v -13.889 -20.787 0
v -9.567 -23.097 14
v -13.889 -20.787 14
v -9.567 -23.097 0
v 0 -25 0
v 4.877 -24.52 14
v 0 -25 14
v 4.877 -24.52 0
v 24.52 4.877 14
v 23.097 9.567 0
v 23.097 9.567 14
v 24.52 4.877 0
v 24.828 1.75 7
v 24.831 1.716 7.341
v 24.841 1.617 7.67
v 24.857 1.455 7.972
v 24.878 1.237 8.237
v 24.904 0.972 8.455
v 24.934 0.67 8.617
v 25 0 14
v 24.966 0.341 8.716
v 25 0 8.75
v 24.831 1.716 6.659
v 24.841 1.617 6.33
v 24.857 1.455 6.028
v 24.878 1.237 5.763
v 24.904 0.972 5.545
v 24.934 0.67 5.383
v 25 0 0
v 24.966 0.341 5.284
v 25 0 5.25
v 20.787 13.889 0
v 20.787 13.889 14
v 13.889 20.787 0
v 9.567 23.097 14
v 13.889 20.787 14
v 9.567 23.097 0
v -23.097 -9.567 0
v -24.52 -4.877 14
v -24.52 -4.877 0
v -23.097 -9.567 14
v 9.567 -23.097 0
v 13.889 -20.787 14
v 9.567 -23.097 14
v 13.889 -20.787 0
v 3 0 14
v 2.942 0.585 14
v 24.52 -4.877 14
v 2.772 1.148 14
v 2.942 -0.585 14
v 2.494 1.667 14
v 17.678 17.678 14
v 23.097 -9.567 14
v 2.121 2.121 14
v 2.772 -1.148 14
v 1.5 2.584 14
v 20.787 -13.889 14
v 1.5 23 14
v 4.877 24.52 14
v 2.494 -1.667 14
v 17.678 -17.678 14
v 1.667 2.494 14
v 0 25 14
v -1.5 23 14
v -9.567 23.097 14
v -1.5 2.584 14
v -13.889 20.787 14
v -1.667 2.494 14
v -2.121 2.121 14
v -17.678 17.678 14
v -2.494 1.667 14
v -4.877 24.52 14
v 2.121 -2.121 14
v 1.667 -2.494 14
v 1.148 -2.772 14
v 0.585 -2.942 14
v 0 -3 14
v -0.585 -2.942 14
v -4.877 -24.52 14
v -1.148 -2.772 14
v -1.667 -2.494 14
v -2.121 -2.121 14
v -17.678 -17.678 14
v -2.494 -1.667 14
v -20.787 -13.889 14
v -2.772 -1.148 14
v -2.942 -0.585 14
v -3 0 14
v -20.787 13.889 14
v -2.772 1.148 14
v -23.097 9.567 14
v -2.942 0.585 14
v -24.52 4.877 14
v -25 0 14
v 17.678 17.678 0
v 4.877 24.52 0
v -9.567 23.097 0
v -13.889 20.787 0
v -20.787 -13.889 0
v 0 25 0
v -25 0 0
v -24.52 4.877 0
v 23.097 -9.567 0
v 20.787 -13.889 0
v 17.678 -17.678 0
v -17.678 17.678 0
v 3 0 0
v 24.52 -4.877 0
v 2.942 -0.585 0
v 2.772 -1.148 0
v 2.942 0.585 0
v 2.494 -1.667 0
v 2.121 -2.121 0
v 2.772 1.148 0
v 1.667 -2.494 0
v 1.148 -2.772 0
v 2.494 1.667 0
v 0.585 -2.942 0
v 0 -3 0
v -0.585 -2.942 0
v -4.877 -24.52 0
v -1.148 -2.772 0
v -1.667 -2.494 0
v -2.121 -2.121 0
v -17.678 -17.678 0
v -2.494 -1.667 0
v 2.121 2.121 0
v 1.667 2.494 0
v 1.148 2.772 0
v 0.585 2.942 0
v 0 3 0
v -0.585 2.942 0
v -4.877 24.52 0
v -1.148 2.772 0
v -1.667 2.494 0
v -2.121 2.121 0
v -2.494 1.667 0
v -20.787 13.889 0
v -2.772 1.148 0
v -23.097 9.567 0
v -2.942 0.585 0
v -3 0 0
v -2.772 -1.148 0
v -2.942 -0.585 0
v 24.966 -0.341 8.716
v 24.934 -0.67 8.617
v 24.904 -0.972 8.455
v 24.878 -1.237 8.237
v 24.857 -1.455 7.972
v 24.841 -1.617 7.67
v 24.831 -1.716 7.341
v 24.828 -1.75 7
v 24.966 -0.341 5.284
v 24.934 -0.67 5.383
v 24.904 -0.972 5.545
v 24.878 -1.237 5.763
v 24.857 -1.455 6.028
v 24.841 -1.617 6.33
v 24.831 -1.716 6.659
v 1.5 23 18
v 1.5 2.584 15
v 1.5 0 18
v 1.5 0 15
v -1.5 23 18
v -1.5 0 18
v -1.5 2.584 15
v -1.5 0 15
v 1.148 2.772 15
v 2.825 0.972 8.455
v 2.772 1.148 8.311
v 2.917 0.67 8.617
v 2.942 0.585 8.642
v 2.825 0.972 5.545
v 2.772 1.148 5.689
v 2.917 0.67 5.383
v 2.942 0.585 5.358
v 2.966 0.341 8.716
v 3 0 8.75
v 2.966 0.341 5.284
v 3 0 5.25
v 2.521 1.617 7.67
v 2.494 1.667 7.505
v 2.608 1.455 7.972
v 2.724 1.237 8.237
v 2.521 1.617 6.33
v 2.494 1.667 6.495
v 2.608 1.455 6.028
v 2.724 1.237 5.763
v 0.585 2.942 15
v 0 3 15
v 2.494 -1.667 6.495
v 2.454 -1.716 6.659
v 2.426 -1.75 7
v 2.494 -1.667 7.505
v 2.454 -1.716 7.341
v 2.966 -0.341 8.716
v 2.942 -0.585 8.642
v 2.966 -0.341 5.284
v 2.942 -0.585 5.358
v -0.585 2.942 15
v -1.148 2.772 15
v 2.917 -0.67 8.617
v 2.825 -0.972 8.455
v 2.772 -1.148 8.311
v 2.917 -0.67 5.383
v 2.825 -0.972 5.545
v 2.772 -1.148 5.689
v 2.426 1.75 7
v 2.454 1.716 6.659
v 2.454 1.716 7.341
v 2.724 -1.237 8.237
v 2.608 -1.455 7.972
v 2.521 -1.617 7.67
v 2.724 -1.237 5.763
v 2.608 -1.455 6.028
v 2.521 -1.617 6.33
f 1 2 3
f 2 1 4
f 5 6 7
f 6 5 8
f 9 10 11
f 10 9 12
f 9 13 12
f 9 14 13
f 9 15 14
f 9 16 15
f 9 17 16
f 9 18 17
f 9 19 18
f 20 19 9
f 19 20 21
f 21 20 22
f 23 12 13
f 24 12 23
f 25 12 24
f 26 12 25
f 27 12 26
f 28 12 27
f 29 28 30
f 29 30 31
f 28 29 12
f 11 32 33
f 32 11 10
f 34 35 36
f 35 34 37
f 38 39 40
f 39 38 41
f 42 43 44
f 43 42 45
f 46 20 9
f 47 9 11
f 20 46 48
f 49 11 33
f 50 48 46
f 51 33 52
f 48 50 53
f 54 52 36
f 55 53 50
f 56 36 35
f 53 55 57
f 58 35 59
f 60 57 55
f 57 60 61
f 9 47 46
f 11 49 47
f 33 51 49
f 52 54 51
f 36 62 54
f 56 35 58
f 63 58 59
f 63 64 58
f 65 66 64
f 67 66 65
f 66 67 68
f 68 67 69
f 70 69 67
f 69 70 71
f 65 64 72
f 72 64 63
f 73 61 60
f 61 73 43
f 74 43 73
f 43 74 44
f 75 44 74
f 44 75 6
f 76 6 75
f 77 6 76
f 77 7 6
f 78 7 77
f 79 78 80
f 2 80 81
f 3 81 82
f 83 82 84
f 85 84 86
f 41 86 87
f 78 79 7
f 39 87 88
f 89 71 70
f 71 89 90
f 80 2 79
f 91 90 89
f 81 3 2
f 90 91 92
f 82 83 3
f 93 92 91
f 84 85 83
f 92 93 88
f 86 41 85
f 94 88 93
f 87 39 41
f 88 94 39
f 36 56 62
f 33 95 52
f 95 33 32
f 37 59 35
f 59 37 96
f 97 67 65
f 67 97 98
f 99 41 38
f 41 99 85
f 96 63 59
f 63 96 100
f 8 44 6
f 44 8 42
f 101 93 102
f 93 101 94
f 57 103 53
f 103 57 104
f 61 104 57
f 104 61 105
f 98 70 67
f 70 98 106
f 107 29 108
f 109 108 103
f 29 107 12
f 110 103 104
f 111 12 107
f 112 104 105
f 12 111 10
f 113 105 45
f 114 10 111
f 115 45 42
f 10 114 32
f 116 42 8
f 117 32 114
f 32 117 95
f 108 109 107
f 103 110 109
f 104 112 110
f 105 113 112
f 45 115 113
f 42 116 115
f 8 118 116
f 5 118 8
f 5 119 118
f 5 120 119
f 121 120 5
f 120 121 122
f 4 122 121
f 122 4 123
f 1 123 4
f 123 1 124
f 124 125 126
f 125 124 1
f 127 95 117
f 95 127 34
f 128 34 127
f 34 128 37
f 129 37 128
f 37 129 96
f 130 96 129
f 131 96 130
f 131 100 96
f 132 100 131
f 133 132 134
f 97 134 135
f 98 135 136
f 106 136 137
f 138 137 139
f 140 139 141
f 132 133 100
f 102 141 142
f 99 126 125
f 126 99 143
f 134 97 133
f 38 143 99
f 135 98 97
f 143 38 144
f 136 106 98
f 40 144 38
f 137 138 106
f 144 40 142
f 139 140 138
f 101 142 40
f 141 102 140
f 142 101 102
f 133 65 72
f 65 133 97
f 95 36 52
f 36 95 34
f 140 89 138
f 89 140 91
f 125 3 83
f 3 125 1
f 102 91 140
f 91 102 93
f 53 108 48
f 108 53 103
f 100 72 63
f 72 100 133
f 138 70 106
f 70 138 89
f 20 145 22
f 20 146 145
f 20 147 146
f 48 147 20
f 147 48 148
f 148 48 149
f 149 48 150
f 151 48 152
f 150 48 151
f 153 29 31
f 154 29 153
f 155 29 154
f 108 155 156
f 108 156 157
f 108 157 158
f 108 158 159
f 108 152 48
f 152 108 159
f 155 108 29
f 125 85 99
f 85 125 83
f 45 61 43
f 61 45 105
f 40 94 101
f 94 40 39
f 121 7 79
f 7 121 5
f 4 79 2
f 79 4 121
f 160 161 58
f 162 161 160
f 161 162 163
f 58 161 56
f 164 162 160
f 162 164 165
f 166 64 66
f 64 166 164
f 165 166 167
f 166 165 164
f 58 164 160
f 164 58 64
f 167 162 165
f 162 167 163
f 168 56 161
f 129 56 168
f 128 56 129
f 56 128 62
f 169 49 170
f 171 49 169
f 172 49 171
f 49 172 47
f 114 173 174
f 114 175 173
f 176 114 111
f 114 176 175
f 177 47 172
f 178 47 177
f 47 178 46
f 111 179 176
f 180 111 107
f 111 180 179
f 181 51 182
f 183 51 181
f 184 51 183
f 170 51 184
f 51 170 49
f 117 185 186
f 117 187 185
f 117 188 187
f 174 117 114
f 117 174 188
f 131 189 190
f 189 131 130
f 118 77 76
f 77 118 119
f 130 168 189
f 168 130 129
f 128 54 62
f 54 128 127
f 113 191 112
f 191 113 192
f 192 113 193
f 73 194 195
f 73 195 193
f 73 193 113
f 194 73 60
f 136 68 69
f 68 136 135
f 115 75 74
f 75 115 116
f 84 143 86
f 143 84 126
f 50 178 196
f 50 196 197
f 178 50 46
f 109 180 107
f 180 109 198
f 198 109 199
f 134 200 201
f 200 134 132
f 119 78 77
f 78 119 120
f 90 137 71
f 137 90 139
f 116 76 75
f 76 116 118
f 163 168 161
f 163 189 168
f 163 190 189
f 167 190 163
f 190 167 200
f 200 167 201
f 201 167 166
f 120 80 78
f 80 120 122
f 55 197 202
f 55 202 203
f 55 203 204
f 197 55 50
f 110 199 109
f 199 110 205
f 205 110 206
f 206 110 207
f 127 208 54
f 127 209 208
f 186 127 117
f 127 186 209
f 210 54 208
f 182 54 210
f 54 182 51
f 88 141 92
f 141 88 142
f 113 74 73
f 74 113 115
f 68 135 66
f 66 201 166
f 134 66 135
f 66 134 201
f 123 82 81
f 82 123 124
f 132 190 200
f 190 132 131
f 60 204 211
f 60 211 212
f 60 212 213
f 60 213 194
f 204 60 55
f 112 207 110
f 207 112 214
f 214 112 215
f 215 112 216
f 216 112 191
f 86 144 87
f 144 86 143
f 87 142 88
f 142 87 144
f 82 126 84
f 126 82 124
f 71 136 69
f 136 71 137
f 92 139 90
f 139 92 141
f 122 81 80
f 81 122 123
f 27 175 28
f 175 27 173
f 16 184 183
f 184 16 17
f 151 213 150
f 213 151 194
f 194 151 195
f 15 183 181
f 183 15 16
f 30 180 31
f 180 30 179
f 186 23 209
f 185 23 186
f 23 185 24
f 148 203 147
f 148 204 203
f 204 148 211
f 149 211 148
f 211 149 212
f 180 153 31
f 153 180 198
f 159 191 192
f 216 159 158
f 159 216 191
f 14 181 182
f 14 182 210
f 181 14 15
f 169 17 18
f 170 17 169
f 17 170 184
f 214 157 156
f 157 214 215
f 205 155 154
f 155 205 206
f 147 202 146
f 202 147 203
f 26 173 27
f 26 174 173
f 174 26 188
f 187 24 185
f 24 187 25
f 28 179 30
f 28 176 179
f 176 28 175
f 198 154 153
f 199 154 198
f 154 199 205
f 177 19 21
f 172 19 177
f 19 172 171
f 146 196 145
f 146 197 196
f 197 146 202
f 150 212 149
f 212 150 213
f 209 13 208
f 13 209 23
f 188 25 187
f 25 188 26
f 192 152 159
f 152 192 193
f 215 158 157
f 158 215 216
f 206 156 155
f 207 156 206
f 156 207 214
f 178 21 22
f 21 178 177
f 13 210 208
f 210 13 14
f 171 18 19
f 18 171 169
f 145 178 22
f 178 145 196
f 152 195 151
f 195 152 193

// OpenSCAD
$fn = 32;

// ----------------------------------------------------------------------
// Control knob: pointer knob
// ----------------------------------------------------------------------

// --- parameters (mm) ---
rib_w = 3;                // pointer rib width
rib_h = 5;                // pointer rib height
knob_d = 50;              // knob body diameter
knob_h = 14;              // knob body height
bore_d = 6;               // shaft bore diameter
set_d = 3.5;              // set screw bore diameter
fit_tol = 0.05;           // tolerance for press fits, mm
free_tol = 0.2;           // tolerance for clearance fits, mm

rib_poke = rib_h - 1;  // rib height above the top
total_h = knob_h + rib_h - 1;  // overall height

difference() {
  union() {
    cylinder(h = knob_h, d = knob_d);
    translate([-rib_w / 2, 0, knob_h - 1])
      cube([rib_w, knob_d / 2 - 2, rib_h]);
  }
  translate([0, 0, -1]) cylinder(h = knob_h + 2, d = bore_d);
  translate([-1, 0, knob_h / 2]) rotate([0, 90, 0])
    cylinder(h = knob_d / 2 + bore_d / 2 + 2, d = set_d);}
